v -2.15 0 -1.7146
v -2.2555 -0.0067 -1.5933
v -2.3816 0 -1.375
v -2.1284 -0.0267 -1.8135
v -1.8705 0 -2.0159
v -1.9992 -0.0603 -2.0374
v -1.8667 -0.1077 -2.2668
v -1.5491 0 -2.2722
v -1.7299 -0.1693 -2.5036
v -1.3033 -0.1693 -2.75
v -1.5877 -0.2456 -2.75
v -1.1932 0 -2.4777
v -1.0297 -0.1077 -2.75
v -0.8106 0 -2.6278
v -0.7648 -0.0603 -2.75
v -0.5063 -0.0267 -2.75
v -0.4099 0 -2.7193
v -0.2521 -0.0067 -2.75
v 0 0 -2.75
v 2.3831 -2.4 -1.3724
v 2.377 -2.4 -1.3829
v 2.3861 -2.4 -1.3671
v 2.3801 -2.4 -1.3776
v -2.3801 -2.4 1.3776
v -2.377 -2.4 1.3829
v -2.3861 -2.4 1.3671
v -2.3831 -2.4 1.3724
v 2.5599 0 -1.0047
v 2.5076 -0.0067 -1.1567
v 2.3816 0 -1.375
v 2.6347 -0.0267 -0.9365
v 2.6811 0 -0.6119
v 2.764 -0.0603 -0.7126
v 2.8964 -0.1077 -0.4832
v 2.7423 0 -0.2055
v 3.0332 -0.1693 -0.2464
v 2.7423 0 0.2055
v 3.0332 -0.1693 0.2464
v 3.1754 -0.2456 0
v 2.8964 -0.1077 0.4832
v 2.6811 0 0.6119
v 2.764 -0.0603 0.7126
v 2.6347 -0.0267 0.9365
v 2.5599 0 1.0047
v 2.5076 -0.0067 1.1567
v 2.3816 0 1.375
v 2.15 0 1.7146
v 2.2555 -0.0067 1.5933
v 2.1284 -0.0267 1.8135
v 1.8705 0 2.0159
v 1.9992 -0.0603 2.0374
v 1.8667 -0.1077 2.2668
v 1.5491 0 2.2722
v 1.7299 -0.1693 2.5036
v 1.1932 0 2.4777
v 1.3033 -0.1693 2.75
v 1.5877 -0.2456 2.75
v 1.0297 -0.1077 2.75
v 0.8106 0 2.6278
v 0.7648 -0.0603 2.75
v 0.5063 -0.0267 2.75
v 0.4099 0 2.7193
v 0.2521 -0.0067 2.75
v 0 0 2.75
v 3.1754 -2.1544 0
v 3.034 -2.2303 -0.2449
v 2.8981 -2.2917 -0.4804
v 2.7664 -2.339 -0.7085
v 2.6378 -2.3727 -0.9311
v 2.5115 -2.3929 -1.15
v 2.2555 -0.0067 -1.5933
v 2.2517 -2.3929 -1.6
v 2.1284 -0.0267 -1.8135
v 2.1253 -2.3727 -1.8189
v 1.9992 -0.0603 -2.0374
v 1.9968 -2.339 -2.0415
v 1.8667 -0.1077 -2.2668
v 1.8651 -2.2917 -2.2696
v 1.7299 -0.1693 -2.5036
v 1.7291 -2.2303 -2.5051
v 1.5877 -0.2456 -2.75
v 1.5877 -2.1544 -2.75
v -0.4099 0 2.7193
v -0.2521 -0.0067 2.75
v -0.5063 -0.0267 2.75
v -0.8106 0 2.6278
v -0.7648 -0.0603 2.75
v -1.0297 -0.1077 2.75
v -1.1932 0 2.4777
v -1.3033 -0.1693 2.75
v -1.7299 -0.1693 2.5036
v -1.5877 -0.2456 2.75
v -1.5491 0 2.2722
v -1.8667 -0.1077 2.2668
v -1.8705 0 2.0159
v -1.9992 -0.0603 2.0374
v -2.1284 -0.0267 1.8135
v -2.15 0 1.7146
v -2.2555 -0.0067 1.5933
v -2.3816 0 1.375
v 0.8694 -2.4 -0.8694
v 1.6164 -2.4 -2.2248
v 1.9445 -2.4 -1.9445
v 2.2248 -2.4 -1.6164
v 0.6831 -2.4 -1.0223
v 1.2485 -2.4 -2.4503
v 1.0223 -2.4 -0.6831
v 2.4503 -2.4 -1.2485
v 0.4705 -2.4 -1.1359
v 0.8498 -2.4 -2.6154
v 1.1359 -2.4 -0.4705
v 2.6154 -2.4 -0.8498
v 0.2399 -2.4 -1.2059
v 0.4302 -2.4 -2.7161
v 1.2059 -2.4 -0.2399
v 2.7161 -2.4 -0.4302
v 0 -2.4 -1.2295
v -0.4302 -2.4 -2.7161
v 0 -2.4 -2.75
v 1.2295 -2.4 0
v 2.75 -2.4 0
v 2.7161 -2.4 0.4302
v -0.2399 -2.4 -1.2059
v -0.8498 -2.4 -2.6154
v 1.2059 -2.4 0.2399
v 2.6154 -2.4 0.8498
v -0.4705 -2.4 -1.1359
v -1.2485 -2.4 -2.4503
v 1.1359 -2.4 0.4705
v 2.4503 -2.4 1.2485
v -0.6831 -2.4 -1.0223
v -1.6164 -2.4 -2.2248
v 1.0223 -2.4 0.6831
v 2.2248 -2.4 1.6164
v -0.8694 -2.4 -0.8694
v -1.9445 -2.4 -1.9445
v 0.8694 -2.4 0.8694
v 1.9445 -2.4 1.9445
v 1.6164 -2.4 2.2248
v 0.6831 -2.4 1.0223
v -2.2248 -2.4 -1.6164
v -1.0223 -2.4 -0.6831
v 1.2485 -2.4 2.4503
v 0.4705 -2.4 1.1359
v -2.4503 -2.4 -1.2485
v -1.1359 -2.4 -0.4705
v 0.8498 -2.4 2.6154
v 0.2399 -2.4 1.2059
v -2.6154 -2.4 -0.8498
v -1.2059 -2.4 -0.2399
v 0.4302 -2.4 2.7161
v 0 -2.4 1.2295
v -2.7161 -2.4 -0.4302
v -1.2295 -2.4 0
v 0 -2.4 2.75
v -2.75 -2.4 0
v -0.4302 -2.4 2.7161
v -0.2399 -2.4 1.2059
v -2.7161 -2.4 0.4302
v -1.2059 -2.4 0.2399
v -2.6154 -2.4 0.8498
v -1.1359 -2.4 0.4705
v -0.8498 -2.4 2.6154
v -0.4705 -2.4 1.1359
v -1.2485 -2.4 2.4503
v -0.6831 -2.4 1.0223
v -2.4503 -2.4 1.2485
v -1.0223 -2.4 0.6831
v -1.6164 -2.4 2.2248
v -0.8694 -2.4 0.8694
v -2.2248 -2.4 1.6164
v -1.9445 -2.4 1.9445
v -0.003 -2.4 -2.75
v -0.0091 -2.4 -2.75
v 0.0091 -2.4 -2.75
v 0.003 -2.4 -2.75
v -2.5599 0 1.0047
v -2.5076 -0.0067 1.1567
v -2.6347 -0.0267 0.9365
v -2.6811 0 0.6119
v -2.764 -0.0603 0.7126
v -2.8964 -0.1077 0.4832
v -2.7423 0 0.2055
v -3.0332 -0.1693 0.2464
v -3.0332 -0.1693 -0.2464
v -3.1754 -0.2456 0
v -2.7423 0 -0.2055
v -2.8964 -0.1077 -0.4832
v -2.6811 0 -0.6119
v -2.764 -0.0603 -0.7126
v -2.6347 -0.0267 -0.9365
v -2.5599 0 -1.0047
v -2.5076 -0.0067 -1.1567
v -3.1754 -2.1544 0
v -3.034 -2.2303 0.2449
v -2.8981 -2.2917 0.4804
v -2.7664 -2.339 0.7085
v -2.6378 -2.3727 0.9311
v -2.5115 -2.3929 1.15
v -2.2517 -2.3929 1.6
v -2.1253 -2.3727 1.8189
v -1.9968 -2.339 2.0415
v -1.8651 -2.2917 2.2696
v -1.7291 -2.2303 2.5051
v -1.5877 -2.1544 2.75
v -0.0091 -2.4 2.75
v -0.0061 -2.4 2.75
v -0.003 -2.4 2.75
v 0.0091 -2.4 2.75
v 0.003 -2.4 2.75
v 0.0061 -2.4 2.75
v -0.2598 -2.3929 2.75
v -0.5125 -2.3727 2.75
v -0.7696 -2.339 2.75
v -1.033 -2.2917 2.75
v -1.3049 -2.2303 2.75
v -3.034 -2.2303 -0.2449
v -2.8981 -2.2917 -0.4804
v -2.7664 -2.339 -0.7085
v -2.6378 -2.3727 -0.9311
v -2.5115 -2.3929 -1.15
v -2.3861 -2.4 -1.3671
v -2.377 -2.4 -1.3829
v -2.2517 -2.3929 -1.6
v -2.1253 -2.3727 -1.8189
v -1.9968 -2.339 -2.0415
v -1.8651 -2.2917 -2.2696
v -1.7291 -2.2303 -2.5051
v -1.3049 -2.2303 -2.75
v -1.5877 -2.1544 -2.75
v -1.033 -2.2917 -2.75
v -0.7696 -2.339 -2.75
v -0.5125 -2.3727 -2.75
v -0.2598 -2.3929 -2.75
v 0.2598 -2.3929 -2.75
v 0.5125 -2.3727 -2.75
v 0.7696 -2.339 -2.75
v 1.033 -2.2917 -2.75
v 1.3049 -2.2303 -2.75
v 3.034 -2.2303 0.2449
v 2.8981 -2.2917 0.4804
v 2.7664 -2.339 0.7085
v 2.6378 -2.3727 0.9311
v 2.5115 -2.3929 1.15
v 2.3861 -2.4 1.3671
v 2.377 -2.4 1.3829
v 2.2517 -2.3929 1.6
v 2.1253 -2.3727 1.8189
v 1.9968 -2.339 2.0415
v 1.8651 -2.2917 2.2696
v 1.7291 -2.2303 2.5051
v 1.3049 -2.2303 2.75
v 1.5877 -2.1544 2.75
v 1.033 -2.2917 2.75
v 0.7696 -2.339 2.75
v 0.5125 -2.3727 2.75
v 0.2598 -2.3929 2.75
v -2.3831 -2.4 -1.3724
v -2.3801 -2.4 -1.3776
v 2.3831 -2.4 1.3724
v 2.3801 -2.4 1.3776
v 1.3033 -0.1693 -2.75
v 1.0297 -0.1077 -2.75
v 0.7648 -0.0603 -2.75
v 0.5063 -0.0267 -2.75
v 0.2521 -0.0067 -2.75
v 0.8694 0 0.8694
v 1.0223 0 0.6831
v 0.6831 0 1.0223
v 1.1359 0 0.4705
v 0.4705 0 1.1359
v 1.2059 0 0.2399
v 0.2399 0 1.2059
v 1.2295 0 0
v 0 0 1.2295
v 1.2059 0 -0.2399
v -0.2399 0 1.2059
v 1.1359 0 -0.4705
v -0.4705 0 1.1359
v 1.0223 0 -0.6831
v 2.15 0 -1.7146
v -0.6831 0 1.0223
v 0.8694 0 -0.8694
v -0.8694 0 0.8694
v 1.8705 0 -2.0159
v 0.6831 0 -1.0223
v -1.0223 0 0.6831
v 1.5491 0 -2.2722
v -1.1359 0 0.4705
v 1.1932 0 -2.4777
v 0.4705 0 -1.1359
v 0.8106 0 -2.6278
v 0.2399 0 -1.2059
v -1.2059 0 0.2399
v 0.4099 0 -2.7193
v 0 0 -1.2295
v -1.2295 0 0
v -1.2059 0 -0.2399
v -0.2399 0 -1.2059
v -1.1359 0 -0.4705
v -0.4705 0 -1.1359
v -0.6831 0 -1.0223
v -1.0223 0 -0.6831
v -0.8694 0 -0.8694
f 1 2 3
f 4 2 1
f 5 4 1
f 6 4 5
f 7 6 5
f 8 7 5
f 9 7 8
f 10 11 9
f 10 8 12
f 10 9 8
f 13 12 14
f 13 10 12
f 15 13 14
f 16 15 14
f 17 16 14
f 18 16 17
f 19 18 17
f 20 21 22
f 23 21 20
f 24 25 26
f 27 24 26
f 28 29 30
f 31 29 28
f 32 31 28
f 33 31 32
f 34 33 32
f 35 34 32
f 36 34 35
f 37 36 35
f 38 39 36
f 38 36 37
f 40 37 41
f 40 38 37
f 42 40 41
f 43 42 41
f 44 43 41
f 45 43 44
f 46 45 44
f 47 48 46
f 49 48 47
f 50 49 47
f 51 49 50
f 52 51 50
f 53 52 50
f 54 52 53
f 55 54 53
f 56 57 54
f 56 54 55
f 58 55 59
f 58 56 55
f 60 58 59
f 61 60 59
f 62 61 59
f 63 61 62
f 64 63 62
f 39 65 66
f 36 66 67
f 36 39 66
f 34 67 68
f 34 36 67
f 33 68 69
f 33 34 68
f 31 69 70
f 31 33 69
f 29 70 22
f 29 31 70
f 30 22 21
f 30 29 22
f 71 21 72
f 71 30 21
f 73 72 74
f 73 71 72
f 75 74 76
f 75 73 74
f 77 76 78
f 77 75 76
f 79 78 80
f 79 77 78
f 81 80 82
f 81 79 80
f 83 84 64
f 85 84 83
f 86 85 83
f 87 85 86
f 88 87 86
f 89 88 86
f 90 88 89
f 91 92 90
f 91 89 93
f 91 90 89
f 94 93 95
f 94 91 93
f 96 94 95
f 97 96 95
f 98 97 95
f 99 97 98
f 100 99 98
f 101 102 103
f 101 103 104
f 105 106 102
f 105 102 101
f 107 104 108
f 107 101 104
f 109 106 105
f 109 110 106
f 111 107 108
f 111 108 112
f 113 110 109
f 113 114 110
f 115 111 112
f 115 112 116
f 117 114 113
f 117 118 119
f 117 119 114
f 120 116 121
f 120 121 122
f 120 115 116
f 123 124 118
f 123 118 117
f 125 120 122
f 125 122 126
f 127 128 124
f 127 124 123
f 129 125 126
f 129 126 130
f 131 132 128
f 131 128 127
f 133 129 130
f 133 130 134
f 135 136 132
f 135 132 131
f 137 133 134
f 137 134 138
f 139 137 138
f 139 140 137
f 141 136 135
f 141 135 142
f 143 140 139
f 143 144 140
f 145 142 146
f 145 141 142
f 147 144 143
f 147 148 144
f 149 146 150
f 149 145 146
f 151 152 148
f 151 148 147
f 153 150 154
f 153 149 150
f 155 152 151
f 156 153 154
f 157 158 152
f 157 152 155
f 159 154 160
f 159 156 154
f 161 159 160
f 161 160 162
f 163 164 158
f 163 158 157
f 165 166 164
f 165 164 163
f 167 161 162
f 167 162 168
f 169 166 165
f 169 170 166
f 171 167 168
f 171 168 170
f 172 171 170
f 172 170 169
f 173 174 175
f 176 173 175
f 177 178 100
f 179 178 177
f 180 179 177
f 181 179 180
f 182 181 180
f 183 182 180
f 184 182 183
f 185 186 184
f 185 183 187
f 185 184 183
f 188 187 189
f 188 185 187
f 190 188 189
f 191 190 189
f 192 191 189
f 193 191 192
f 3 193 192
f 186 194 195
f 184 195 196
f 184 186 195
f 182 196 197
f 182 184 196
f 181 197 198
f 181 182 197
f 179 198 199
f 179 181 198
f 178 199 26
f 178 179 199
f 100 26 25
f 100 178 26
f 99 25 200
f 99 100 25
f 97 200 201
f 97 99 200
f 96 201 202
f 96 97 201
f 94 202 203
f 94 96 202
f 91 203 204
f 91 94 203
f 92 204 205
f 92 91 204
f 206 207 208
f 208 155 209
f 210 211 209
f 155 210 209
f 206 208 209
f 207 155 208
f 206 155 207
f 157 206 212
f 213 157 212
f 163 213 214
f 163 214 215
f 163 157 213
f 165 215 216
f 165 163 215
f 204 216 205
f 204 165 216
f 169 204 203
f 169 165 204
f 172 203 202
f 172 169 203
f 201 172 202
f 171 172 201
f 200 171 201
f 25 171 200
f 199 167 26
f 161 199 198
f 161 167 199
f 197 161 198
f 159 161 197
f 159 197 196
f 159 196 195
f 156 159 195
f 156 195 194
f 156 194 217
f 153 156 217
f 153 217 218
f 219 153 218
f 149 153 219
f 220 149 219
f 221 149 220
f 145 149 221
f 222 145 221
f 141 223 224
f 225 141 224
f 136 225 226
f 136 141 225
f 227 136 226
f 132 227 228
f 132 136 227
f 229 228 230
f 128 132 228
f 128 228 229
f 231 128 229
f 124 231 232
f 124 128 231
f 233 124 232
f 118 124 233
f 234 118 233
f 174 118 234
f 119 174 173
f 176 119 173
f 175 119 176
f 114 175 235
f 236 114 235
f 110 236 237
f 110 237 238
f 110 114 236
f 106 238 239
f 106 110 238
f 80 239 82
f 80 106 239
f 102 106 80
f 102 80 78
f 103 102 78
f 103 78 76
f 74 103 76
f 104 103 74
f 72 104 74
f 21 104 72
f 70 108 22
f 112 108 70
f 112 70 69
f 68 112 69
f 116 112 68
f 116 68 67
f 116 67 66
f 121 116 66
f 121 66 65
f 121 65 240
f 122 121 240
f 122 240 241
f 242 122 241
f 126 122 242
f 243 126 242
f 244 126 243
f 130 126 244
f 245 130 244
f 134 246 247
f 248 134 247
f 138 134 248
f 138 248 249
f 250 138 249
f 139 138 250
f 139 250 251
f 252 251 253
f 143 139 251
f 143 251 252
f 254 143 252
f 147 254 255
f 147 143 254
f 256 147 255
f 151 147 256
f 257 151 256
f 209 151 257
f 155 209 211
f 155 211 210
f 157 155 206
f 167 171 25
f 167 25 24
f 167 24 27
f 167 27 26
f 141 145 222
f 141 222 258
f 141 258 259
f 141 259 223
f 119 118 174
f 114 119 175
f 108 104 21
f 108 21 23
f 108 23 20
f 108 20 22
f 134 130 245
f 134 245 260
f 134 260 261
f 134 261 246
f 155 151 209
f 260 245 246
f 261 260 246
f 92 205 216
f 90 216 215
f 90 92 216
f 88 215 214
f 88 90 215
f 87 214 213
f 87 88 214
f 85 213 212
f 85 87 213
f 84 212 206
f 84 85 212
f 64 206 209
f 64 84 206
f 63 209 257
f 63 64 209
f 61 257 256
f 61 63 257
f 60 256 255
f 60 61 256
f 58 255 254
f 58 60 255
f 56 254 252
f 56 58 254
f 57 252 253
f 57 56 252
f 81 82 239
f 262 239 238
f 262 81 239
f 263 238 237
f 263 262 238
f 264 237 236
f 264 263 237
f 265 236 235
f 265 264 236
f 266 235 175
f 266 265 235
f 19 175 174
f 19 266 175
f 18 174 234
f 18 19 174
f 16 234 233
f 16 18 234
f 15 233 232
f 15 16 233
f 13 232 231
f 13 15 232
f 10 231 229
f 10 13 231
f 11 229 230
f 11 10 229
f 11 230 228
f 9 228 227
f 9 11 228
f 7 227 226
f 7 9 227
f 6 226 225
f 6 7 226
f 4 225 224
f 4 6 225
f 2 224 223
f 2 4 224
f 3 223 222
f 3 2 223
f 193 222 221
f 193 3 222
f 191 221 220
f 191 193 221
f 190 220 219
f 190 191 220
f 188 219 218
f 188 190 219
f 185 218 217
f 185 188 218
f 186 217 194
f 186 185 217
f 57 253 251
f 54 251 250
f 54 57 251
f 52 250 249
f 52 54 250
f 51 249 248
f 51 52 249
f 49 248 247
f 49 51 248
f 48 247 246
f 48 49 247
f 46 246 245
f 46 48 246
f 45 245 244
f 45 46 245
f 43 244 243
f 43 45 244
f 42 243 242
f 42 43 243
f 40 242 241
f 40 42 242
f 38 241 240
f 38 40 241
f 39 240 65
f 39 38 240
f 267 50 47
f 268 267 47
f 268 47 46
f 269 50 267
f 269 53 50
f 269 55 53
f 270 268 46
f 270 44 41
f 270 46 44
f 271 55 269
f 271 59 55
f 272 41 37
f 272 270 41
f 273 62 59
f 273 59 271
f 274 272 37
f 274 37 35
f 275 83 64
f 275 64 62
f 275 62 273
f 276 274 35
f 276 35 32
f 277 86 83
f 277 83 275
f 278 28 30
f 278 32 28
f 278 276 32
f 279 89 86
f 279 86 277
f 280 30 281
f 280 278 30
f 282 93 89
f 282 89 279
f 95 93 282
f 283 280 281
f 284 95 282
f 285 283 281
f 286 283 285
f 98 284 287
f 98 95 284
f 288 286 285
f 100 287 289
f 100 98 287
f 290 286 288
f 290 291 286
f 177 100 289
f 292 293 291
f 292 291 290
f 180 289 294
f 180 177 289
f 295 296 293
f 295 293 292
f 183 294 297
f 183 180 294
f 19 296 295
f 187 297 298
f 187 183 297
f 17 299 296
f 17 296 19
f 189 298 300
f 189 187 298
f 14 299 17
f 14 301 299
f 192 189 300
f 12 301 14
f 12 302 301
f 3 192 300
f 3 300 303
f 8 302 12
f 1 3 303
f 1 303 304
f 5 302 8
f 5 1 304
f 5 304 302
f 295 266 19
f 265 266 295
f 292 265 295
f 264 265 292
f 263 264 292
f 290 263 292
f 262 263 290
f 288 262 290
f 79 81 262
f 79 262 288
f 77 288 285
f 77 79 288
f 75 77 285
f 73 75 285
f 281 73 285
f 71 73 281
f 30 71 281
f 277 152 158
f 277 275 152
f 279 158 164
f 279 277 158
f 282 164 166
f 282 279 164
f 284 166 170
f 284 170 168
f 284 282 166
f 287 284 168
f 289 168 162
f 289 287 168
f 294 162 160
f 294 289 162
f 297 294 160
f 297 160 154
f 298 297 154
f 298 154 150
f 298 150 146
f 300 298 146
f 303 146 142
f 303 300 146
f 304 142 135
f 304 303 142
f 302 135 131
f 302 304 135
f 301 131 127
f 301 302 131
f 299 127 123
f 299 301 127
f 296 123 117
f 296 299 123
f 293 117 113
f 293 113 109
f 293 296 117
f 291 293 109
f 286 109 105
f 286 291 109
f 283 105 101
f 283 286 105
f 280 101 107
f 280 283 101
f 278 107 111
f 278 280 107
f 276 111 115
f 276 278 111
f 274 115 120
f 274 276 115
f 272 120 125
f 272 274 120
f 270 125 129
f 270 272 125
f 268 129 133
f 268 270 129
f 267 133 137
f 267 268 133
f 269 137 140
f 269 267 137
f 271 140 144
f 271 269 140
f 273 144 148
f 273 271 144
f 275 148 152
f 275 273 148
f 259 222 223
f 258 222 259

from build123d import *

# Parameters (mm, degrees)
SCHNITT_LINEAR_START            = -1e-07
SCHNITT_LINEAR_AUSTRAGEN1_DEPTH = 2.399991326


# Read off the part's stored shape, not the designer's step: Schnitt-Linear austragen1
with BuildPart() as part:
    # Skizze1 → Basis-Rotation (revolve)
    with BuildSketch(Plane.XY, mode=Mode.PRIVATE) as basis_rotation_sk:
        Polygon((1.2295, 0), (2.75, 0), (3.175426481, -0.245620093), (3.175426481, -2.154379907), (2.75, -2.4), (1.2295, -2.4), align=None)
    revolve(basis_rotation_sk.sketch.rotate(Axis((0, 0, 0), (0, -1, 0)), 90), axis=Axis((0, 0, 0), (0, -1, 0)))

    # Schnitt-Linear austragen1 outline → Schnitt-Linear austragen1 (cut)
    with BuildSketch(Plane.XZ.offset(SCHNITT_LINEAR_START)):
        with BuildLine():
            ThreePointArc((-1.58771324, -2.750000001), (0, -3.175426481), (1.58771324, -2.750000001))
            Line((1.58771324, -2.750000001), (-1.58771324, -2.750000001))
        make_face()
        with BuildLine():
            Line((3.175426481, 0), (1.58771324, -2.750000001))
            ThreePointArc((1.58771324, -2.750000001), (2.75, -1.587713241), (3.175426481, 0))
        make_face()
        with BuildLine():
            ThreePointArc((-3.175426481, 0), (-2.75, -1.587713241), (-1.58771324, -2.750000001))
            Line((-1.58771324, -2.750000001), (-3.175426481, 0))
        make_face()
        with BuildLine():
            Line((1.58771324, 2.750000001), (3.175426481, 0))
            ThreePointArc((3.175426481, 0), (2.75, 1.587713241), (1.58771324, 2.750000001))
        make_face()
        with BuildLine():
            ThreePointArc((-1.58771324, 2.750000001), (-2.75, 1.587713241), (-3.175426481, 0))
            Line((-3.175426481, 0), (-1.58771324, 2.750000001))
        make_face()
        with BuildLine():
            Line((-1.58771324, 2.750000001), (1.58771324, 2.750000001))
            ThreePointArc((1.58771324, 2.750000001), (0, 3.175426481), (-1.58771324, 2.750000001))
        make_face()
    extrude(amount=SCHNITT_LINEAR_AUSTRAGEN1_DEPTH, mode=Mode.SUBTRACT)


solid = part.part
